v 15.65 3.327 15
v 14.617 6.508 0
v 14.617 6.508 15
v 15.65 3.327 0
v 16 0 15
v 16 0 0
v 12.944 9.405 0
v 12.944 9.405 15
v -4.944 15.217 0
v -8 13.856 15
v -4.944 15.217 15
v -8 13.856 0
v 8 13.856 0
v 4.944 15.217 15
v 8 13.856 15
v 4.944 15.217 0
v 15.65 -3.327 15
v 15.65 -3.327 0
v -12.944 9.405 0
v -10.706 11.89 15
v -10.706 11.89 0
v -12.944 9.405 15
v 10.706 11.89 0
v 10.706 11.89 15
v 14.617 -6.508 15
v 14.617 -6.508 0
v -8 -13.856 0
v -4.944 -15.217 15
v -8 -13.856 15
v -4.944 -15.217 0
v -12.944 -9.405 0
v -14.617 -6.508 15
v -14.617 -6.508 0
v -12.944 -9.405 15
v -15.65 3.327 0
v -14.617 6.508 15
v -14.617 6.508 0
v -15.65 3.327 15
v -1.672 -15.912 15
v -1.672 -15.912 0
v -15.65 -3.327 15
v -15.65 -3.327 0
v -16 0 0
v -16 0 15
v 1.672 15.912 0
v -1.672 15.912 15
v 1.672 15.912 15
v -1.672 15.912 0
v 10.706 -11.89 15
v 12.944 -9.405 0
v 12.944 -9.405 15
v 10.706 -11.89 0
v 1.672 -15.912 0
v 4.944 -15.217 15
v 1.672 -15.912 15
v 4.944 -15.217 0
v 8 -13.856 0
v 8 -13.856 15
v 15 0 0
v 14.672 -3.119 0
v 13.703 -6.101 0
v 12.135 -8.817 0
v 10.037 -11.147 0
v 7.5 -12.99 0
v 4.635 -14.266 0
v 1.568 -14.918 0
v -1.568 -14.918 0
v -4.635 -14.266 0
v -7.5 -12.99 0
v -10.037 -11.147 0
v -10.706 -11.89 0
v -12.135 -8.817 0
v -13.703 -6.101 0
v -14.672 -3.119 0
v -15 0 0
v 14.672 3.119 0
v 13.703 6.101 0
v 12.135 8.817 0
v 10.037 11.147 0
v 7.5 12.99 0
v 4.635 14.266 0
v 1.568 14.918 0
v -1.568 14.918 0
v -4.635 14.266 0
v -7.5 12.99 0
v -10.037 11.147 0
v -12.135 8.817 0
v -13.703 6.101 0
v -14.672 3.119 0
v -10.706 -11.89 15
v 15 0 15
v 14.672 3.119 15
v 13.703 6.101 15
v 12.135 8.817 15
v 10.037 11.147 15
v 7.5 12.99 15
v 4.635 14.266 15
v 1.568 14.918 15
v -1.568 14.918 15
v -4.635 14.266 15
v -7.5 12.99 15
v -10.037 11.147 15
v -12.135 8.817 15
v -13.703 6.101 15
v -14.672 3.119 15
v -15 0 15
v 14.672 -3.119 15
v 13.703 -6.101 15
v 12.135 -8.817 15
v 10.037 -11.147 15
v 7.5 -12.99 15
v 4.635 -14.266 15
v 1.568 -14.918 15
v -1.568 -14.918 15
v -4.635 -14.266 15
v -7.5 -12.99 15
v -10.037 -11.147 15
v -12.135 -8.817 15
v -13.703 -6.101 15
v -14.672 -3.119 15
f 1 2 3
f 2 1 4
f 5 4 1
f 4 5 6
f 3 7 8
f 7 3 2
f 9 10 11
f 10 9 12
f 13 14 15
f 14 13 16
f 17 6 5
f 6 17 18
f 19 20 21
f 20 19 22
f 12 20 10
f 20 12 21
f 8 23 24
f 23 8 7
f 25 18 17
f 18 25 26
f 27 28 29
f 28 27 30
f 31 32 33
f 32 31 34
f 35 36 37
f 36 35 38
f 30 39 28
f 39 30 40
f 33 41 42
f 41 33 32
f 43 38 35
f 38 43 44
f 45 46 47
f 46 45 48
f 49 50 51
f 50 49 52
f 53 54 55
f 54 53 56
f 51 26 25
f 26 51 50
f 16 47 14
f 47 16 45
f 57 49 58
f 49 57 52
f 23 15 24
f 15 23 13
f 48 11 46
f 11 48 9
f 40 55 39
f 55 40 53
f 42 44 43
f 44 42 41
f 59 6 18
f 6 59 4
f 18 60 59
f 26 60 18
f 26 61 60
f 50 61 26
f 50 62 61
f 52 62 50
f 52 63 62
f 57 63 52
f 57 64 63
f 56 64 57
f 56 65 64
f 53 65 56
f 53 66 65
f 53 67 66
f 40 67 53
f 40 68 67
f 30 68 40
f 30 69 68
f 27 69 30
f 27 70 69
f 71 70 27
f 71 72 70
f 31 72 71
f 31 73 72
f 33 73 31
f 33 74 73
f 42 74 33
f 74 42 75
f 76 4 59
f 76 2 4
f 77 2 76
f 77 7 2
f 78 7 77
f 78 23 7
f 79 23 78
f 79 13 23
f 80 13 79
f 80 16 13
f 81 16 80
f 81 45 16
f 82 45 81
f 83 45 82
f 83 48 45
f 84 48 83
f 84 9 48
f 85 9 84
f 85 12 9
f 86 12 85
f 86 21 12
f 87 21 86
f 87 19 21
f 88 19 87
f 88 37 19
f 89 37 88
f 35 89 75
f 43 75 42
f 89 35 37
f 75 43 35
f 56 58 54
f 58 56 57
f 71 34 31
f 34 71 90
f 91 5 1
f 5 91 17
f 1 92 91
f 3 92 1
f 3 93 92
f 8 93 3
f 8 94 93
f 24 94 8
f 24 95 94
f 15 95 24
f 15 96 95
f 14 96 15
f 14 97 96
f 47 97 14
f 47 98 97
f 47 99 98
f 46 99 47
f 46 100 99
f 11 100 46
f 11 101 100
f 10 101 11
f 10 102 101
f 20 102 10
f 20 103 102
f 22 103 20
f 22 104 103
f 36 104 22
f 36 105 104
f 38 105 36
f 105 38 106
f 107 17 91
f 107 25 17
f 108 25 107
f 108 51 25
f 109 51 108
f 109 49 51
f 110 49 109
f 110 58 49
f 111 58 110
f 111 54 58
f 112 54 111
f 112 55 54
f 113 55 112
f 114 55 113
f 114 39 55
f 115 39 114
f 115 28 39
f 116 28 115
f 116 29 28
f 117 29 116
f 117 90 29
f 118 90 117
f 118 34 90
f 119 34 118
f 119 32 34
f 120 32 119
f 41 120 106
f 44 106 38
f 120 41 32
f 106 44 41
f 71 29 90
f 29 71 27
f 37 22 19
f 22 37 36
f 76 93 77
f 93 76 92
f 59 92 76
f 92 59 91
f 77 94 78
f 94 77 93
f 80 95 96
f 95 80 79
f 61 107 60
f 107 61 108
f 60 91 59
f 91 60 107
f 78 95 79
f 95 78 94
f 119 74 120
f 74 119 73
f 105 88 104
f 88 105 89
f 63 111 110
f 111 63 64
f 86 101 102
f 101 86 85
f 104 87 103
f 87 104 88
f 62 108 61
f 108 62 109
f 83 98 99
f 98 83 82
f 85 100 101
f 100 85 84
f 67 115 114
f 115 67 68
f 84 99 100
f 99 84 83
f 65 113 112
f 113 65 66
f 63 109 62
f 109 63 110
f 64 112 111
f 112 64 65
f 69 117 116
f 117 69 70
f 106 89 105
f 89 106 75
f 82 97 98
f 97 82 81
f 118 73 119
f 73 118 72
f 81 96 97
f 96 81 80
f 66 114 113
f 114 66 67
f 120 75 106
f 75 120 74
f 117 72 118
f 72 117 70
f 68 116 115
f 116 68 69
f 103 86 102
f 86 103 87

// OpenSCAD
difference() {
	cylinder(h = 15, r=16, center=false);
	translate([0,0,-5]) cylinder(h = 25, r=15, center=false);
}
